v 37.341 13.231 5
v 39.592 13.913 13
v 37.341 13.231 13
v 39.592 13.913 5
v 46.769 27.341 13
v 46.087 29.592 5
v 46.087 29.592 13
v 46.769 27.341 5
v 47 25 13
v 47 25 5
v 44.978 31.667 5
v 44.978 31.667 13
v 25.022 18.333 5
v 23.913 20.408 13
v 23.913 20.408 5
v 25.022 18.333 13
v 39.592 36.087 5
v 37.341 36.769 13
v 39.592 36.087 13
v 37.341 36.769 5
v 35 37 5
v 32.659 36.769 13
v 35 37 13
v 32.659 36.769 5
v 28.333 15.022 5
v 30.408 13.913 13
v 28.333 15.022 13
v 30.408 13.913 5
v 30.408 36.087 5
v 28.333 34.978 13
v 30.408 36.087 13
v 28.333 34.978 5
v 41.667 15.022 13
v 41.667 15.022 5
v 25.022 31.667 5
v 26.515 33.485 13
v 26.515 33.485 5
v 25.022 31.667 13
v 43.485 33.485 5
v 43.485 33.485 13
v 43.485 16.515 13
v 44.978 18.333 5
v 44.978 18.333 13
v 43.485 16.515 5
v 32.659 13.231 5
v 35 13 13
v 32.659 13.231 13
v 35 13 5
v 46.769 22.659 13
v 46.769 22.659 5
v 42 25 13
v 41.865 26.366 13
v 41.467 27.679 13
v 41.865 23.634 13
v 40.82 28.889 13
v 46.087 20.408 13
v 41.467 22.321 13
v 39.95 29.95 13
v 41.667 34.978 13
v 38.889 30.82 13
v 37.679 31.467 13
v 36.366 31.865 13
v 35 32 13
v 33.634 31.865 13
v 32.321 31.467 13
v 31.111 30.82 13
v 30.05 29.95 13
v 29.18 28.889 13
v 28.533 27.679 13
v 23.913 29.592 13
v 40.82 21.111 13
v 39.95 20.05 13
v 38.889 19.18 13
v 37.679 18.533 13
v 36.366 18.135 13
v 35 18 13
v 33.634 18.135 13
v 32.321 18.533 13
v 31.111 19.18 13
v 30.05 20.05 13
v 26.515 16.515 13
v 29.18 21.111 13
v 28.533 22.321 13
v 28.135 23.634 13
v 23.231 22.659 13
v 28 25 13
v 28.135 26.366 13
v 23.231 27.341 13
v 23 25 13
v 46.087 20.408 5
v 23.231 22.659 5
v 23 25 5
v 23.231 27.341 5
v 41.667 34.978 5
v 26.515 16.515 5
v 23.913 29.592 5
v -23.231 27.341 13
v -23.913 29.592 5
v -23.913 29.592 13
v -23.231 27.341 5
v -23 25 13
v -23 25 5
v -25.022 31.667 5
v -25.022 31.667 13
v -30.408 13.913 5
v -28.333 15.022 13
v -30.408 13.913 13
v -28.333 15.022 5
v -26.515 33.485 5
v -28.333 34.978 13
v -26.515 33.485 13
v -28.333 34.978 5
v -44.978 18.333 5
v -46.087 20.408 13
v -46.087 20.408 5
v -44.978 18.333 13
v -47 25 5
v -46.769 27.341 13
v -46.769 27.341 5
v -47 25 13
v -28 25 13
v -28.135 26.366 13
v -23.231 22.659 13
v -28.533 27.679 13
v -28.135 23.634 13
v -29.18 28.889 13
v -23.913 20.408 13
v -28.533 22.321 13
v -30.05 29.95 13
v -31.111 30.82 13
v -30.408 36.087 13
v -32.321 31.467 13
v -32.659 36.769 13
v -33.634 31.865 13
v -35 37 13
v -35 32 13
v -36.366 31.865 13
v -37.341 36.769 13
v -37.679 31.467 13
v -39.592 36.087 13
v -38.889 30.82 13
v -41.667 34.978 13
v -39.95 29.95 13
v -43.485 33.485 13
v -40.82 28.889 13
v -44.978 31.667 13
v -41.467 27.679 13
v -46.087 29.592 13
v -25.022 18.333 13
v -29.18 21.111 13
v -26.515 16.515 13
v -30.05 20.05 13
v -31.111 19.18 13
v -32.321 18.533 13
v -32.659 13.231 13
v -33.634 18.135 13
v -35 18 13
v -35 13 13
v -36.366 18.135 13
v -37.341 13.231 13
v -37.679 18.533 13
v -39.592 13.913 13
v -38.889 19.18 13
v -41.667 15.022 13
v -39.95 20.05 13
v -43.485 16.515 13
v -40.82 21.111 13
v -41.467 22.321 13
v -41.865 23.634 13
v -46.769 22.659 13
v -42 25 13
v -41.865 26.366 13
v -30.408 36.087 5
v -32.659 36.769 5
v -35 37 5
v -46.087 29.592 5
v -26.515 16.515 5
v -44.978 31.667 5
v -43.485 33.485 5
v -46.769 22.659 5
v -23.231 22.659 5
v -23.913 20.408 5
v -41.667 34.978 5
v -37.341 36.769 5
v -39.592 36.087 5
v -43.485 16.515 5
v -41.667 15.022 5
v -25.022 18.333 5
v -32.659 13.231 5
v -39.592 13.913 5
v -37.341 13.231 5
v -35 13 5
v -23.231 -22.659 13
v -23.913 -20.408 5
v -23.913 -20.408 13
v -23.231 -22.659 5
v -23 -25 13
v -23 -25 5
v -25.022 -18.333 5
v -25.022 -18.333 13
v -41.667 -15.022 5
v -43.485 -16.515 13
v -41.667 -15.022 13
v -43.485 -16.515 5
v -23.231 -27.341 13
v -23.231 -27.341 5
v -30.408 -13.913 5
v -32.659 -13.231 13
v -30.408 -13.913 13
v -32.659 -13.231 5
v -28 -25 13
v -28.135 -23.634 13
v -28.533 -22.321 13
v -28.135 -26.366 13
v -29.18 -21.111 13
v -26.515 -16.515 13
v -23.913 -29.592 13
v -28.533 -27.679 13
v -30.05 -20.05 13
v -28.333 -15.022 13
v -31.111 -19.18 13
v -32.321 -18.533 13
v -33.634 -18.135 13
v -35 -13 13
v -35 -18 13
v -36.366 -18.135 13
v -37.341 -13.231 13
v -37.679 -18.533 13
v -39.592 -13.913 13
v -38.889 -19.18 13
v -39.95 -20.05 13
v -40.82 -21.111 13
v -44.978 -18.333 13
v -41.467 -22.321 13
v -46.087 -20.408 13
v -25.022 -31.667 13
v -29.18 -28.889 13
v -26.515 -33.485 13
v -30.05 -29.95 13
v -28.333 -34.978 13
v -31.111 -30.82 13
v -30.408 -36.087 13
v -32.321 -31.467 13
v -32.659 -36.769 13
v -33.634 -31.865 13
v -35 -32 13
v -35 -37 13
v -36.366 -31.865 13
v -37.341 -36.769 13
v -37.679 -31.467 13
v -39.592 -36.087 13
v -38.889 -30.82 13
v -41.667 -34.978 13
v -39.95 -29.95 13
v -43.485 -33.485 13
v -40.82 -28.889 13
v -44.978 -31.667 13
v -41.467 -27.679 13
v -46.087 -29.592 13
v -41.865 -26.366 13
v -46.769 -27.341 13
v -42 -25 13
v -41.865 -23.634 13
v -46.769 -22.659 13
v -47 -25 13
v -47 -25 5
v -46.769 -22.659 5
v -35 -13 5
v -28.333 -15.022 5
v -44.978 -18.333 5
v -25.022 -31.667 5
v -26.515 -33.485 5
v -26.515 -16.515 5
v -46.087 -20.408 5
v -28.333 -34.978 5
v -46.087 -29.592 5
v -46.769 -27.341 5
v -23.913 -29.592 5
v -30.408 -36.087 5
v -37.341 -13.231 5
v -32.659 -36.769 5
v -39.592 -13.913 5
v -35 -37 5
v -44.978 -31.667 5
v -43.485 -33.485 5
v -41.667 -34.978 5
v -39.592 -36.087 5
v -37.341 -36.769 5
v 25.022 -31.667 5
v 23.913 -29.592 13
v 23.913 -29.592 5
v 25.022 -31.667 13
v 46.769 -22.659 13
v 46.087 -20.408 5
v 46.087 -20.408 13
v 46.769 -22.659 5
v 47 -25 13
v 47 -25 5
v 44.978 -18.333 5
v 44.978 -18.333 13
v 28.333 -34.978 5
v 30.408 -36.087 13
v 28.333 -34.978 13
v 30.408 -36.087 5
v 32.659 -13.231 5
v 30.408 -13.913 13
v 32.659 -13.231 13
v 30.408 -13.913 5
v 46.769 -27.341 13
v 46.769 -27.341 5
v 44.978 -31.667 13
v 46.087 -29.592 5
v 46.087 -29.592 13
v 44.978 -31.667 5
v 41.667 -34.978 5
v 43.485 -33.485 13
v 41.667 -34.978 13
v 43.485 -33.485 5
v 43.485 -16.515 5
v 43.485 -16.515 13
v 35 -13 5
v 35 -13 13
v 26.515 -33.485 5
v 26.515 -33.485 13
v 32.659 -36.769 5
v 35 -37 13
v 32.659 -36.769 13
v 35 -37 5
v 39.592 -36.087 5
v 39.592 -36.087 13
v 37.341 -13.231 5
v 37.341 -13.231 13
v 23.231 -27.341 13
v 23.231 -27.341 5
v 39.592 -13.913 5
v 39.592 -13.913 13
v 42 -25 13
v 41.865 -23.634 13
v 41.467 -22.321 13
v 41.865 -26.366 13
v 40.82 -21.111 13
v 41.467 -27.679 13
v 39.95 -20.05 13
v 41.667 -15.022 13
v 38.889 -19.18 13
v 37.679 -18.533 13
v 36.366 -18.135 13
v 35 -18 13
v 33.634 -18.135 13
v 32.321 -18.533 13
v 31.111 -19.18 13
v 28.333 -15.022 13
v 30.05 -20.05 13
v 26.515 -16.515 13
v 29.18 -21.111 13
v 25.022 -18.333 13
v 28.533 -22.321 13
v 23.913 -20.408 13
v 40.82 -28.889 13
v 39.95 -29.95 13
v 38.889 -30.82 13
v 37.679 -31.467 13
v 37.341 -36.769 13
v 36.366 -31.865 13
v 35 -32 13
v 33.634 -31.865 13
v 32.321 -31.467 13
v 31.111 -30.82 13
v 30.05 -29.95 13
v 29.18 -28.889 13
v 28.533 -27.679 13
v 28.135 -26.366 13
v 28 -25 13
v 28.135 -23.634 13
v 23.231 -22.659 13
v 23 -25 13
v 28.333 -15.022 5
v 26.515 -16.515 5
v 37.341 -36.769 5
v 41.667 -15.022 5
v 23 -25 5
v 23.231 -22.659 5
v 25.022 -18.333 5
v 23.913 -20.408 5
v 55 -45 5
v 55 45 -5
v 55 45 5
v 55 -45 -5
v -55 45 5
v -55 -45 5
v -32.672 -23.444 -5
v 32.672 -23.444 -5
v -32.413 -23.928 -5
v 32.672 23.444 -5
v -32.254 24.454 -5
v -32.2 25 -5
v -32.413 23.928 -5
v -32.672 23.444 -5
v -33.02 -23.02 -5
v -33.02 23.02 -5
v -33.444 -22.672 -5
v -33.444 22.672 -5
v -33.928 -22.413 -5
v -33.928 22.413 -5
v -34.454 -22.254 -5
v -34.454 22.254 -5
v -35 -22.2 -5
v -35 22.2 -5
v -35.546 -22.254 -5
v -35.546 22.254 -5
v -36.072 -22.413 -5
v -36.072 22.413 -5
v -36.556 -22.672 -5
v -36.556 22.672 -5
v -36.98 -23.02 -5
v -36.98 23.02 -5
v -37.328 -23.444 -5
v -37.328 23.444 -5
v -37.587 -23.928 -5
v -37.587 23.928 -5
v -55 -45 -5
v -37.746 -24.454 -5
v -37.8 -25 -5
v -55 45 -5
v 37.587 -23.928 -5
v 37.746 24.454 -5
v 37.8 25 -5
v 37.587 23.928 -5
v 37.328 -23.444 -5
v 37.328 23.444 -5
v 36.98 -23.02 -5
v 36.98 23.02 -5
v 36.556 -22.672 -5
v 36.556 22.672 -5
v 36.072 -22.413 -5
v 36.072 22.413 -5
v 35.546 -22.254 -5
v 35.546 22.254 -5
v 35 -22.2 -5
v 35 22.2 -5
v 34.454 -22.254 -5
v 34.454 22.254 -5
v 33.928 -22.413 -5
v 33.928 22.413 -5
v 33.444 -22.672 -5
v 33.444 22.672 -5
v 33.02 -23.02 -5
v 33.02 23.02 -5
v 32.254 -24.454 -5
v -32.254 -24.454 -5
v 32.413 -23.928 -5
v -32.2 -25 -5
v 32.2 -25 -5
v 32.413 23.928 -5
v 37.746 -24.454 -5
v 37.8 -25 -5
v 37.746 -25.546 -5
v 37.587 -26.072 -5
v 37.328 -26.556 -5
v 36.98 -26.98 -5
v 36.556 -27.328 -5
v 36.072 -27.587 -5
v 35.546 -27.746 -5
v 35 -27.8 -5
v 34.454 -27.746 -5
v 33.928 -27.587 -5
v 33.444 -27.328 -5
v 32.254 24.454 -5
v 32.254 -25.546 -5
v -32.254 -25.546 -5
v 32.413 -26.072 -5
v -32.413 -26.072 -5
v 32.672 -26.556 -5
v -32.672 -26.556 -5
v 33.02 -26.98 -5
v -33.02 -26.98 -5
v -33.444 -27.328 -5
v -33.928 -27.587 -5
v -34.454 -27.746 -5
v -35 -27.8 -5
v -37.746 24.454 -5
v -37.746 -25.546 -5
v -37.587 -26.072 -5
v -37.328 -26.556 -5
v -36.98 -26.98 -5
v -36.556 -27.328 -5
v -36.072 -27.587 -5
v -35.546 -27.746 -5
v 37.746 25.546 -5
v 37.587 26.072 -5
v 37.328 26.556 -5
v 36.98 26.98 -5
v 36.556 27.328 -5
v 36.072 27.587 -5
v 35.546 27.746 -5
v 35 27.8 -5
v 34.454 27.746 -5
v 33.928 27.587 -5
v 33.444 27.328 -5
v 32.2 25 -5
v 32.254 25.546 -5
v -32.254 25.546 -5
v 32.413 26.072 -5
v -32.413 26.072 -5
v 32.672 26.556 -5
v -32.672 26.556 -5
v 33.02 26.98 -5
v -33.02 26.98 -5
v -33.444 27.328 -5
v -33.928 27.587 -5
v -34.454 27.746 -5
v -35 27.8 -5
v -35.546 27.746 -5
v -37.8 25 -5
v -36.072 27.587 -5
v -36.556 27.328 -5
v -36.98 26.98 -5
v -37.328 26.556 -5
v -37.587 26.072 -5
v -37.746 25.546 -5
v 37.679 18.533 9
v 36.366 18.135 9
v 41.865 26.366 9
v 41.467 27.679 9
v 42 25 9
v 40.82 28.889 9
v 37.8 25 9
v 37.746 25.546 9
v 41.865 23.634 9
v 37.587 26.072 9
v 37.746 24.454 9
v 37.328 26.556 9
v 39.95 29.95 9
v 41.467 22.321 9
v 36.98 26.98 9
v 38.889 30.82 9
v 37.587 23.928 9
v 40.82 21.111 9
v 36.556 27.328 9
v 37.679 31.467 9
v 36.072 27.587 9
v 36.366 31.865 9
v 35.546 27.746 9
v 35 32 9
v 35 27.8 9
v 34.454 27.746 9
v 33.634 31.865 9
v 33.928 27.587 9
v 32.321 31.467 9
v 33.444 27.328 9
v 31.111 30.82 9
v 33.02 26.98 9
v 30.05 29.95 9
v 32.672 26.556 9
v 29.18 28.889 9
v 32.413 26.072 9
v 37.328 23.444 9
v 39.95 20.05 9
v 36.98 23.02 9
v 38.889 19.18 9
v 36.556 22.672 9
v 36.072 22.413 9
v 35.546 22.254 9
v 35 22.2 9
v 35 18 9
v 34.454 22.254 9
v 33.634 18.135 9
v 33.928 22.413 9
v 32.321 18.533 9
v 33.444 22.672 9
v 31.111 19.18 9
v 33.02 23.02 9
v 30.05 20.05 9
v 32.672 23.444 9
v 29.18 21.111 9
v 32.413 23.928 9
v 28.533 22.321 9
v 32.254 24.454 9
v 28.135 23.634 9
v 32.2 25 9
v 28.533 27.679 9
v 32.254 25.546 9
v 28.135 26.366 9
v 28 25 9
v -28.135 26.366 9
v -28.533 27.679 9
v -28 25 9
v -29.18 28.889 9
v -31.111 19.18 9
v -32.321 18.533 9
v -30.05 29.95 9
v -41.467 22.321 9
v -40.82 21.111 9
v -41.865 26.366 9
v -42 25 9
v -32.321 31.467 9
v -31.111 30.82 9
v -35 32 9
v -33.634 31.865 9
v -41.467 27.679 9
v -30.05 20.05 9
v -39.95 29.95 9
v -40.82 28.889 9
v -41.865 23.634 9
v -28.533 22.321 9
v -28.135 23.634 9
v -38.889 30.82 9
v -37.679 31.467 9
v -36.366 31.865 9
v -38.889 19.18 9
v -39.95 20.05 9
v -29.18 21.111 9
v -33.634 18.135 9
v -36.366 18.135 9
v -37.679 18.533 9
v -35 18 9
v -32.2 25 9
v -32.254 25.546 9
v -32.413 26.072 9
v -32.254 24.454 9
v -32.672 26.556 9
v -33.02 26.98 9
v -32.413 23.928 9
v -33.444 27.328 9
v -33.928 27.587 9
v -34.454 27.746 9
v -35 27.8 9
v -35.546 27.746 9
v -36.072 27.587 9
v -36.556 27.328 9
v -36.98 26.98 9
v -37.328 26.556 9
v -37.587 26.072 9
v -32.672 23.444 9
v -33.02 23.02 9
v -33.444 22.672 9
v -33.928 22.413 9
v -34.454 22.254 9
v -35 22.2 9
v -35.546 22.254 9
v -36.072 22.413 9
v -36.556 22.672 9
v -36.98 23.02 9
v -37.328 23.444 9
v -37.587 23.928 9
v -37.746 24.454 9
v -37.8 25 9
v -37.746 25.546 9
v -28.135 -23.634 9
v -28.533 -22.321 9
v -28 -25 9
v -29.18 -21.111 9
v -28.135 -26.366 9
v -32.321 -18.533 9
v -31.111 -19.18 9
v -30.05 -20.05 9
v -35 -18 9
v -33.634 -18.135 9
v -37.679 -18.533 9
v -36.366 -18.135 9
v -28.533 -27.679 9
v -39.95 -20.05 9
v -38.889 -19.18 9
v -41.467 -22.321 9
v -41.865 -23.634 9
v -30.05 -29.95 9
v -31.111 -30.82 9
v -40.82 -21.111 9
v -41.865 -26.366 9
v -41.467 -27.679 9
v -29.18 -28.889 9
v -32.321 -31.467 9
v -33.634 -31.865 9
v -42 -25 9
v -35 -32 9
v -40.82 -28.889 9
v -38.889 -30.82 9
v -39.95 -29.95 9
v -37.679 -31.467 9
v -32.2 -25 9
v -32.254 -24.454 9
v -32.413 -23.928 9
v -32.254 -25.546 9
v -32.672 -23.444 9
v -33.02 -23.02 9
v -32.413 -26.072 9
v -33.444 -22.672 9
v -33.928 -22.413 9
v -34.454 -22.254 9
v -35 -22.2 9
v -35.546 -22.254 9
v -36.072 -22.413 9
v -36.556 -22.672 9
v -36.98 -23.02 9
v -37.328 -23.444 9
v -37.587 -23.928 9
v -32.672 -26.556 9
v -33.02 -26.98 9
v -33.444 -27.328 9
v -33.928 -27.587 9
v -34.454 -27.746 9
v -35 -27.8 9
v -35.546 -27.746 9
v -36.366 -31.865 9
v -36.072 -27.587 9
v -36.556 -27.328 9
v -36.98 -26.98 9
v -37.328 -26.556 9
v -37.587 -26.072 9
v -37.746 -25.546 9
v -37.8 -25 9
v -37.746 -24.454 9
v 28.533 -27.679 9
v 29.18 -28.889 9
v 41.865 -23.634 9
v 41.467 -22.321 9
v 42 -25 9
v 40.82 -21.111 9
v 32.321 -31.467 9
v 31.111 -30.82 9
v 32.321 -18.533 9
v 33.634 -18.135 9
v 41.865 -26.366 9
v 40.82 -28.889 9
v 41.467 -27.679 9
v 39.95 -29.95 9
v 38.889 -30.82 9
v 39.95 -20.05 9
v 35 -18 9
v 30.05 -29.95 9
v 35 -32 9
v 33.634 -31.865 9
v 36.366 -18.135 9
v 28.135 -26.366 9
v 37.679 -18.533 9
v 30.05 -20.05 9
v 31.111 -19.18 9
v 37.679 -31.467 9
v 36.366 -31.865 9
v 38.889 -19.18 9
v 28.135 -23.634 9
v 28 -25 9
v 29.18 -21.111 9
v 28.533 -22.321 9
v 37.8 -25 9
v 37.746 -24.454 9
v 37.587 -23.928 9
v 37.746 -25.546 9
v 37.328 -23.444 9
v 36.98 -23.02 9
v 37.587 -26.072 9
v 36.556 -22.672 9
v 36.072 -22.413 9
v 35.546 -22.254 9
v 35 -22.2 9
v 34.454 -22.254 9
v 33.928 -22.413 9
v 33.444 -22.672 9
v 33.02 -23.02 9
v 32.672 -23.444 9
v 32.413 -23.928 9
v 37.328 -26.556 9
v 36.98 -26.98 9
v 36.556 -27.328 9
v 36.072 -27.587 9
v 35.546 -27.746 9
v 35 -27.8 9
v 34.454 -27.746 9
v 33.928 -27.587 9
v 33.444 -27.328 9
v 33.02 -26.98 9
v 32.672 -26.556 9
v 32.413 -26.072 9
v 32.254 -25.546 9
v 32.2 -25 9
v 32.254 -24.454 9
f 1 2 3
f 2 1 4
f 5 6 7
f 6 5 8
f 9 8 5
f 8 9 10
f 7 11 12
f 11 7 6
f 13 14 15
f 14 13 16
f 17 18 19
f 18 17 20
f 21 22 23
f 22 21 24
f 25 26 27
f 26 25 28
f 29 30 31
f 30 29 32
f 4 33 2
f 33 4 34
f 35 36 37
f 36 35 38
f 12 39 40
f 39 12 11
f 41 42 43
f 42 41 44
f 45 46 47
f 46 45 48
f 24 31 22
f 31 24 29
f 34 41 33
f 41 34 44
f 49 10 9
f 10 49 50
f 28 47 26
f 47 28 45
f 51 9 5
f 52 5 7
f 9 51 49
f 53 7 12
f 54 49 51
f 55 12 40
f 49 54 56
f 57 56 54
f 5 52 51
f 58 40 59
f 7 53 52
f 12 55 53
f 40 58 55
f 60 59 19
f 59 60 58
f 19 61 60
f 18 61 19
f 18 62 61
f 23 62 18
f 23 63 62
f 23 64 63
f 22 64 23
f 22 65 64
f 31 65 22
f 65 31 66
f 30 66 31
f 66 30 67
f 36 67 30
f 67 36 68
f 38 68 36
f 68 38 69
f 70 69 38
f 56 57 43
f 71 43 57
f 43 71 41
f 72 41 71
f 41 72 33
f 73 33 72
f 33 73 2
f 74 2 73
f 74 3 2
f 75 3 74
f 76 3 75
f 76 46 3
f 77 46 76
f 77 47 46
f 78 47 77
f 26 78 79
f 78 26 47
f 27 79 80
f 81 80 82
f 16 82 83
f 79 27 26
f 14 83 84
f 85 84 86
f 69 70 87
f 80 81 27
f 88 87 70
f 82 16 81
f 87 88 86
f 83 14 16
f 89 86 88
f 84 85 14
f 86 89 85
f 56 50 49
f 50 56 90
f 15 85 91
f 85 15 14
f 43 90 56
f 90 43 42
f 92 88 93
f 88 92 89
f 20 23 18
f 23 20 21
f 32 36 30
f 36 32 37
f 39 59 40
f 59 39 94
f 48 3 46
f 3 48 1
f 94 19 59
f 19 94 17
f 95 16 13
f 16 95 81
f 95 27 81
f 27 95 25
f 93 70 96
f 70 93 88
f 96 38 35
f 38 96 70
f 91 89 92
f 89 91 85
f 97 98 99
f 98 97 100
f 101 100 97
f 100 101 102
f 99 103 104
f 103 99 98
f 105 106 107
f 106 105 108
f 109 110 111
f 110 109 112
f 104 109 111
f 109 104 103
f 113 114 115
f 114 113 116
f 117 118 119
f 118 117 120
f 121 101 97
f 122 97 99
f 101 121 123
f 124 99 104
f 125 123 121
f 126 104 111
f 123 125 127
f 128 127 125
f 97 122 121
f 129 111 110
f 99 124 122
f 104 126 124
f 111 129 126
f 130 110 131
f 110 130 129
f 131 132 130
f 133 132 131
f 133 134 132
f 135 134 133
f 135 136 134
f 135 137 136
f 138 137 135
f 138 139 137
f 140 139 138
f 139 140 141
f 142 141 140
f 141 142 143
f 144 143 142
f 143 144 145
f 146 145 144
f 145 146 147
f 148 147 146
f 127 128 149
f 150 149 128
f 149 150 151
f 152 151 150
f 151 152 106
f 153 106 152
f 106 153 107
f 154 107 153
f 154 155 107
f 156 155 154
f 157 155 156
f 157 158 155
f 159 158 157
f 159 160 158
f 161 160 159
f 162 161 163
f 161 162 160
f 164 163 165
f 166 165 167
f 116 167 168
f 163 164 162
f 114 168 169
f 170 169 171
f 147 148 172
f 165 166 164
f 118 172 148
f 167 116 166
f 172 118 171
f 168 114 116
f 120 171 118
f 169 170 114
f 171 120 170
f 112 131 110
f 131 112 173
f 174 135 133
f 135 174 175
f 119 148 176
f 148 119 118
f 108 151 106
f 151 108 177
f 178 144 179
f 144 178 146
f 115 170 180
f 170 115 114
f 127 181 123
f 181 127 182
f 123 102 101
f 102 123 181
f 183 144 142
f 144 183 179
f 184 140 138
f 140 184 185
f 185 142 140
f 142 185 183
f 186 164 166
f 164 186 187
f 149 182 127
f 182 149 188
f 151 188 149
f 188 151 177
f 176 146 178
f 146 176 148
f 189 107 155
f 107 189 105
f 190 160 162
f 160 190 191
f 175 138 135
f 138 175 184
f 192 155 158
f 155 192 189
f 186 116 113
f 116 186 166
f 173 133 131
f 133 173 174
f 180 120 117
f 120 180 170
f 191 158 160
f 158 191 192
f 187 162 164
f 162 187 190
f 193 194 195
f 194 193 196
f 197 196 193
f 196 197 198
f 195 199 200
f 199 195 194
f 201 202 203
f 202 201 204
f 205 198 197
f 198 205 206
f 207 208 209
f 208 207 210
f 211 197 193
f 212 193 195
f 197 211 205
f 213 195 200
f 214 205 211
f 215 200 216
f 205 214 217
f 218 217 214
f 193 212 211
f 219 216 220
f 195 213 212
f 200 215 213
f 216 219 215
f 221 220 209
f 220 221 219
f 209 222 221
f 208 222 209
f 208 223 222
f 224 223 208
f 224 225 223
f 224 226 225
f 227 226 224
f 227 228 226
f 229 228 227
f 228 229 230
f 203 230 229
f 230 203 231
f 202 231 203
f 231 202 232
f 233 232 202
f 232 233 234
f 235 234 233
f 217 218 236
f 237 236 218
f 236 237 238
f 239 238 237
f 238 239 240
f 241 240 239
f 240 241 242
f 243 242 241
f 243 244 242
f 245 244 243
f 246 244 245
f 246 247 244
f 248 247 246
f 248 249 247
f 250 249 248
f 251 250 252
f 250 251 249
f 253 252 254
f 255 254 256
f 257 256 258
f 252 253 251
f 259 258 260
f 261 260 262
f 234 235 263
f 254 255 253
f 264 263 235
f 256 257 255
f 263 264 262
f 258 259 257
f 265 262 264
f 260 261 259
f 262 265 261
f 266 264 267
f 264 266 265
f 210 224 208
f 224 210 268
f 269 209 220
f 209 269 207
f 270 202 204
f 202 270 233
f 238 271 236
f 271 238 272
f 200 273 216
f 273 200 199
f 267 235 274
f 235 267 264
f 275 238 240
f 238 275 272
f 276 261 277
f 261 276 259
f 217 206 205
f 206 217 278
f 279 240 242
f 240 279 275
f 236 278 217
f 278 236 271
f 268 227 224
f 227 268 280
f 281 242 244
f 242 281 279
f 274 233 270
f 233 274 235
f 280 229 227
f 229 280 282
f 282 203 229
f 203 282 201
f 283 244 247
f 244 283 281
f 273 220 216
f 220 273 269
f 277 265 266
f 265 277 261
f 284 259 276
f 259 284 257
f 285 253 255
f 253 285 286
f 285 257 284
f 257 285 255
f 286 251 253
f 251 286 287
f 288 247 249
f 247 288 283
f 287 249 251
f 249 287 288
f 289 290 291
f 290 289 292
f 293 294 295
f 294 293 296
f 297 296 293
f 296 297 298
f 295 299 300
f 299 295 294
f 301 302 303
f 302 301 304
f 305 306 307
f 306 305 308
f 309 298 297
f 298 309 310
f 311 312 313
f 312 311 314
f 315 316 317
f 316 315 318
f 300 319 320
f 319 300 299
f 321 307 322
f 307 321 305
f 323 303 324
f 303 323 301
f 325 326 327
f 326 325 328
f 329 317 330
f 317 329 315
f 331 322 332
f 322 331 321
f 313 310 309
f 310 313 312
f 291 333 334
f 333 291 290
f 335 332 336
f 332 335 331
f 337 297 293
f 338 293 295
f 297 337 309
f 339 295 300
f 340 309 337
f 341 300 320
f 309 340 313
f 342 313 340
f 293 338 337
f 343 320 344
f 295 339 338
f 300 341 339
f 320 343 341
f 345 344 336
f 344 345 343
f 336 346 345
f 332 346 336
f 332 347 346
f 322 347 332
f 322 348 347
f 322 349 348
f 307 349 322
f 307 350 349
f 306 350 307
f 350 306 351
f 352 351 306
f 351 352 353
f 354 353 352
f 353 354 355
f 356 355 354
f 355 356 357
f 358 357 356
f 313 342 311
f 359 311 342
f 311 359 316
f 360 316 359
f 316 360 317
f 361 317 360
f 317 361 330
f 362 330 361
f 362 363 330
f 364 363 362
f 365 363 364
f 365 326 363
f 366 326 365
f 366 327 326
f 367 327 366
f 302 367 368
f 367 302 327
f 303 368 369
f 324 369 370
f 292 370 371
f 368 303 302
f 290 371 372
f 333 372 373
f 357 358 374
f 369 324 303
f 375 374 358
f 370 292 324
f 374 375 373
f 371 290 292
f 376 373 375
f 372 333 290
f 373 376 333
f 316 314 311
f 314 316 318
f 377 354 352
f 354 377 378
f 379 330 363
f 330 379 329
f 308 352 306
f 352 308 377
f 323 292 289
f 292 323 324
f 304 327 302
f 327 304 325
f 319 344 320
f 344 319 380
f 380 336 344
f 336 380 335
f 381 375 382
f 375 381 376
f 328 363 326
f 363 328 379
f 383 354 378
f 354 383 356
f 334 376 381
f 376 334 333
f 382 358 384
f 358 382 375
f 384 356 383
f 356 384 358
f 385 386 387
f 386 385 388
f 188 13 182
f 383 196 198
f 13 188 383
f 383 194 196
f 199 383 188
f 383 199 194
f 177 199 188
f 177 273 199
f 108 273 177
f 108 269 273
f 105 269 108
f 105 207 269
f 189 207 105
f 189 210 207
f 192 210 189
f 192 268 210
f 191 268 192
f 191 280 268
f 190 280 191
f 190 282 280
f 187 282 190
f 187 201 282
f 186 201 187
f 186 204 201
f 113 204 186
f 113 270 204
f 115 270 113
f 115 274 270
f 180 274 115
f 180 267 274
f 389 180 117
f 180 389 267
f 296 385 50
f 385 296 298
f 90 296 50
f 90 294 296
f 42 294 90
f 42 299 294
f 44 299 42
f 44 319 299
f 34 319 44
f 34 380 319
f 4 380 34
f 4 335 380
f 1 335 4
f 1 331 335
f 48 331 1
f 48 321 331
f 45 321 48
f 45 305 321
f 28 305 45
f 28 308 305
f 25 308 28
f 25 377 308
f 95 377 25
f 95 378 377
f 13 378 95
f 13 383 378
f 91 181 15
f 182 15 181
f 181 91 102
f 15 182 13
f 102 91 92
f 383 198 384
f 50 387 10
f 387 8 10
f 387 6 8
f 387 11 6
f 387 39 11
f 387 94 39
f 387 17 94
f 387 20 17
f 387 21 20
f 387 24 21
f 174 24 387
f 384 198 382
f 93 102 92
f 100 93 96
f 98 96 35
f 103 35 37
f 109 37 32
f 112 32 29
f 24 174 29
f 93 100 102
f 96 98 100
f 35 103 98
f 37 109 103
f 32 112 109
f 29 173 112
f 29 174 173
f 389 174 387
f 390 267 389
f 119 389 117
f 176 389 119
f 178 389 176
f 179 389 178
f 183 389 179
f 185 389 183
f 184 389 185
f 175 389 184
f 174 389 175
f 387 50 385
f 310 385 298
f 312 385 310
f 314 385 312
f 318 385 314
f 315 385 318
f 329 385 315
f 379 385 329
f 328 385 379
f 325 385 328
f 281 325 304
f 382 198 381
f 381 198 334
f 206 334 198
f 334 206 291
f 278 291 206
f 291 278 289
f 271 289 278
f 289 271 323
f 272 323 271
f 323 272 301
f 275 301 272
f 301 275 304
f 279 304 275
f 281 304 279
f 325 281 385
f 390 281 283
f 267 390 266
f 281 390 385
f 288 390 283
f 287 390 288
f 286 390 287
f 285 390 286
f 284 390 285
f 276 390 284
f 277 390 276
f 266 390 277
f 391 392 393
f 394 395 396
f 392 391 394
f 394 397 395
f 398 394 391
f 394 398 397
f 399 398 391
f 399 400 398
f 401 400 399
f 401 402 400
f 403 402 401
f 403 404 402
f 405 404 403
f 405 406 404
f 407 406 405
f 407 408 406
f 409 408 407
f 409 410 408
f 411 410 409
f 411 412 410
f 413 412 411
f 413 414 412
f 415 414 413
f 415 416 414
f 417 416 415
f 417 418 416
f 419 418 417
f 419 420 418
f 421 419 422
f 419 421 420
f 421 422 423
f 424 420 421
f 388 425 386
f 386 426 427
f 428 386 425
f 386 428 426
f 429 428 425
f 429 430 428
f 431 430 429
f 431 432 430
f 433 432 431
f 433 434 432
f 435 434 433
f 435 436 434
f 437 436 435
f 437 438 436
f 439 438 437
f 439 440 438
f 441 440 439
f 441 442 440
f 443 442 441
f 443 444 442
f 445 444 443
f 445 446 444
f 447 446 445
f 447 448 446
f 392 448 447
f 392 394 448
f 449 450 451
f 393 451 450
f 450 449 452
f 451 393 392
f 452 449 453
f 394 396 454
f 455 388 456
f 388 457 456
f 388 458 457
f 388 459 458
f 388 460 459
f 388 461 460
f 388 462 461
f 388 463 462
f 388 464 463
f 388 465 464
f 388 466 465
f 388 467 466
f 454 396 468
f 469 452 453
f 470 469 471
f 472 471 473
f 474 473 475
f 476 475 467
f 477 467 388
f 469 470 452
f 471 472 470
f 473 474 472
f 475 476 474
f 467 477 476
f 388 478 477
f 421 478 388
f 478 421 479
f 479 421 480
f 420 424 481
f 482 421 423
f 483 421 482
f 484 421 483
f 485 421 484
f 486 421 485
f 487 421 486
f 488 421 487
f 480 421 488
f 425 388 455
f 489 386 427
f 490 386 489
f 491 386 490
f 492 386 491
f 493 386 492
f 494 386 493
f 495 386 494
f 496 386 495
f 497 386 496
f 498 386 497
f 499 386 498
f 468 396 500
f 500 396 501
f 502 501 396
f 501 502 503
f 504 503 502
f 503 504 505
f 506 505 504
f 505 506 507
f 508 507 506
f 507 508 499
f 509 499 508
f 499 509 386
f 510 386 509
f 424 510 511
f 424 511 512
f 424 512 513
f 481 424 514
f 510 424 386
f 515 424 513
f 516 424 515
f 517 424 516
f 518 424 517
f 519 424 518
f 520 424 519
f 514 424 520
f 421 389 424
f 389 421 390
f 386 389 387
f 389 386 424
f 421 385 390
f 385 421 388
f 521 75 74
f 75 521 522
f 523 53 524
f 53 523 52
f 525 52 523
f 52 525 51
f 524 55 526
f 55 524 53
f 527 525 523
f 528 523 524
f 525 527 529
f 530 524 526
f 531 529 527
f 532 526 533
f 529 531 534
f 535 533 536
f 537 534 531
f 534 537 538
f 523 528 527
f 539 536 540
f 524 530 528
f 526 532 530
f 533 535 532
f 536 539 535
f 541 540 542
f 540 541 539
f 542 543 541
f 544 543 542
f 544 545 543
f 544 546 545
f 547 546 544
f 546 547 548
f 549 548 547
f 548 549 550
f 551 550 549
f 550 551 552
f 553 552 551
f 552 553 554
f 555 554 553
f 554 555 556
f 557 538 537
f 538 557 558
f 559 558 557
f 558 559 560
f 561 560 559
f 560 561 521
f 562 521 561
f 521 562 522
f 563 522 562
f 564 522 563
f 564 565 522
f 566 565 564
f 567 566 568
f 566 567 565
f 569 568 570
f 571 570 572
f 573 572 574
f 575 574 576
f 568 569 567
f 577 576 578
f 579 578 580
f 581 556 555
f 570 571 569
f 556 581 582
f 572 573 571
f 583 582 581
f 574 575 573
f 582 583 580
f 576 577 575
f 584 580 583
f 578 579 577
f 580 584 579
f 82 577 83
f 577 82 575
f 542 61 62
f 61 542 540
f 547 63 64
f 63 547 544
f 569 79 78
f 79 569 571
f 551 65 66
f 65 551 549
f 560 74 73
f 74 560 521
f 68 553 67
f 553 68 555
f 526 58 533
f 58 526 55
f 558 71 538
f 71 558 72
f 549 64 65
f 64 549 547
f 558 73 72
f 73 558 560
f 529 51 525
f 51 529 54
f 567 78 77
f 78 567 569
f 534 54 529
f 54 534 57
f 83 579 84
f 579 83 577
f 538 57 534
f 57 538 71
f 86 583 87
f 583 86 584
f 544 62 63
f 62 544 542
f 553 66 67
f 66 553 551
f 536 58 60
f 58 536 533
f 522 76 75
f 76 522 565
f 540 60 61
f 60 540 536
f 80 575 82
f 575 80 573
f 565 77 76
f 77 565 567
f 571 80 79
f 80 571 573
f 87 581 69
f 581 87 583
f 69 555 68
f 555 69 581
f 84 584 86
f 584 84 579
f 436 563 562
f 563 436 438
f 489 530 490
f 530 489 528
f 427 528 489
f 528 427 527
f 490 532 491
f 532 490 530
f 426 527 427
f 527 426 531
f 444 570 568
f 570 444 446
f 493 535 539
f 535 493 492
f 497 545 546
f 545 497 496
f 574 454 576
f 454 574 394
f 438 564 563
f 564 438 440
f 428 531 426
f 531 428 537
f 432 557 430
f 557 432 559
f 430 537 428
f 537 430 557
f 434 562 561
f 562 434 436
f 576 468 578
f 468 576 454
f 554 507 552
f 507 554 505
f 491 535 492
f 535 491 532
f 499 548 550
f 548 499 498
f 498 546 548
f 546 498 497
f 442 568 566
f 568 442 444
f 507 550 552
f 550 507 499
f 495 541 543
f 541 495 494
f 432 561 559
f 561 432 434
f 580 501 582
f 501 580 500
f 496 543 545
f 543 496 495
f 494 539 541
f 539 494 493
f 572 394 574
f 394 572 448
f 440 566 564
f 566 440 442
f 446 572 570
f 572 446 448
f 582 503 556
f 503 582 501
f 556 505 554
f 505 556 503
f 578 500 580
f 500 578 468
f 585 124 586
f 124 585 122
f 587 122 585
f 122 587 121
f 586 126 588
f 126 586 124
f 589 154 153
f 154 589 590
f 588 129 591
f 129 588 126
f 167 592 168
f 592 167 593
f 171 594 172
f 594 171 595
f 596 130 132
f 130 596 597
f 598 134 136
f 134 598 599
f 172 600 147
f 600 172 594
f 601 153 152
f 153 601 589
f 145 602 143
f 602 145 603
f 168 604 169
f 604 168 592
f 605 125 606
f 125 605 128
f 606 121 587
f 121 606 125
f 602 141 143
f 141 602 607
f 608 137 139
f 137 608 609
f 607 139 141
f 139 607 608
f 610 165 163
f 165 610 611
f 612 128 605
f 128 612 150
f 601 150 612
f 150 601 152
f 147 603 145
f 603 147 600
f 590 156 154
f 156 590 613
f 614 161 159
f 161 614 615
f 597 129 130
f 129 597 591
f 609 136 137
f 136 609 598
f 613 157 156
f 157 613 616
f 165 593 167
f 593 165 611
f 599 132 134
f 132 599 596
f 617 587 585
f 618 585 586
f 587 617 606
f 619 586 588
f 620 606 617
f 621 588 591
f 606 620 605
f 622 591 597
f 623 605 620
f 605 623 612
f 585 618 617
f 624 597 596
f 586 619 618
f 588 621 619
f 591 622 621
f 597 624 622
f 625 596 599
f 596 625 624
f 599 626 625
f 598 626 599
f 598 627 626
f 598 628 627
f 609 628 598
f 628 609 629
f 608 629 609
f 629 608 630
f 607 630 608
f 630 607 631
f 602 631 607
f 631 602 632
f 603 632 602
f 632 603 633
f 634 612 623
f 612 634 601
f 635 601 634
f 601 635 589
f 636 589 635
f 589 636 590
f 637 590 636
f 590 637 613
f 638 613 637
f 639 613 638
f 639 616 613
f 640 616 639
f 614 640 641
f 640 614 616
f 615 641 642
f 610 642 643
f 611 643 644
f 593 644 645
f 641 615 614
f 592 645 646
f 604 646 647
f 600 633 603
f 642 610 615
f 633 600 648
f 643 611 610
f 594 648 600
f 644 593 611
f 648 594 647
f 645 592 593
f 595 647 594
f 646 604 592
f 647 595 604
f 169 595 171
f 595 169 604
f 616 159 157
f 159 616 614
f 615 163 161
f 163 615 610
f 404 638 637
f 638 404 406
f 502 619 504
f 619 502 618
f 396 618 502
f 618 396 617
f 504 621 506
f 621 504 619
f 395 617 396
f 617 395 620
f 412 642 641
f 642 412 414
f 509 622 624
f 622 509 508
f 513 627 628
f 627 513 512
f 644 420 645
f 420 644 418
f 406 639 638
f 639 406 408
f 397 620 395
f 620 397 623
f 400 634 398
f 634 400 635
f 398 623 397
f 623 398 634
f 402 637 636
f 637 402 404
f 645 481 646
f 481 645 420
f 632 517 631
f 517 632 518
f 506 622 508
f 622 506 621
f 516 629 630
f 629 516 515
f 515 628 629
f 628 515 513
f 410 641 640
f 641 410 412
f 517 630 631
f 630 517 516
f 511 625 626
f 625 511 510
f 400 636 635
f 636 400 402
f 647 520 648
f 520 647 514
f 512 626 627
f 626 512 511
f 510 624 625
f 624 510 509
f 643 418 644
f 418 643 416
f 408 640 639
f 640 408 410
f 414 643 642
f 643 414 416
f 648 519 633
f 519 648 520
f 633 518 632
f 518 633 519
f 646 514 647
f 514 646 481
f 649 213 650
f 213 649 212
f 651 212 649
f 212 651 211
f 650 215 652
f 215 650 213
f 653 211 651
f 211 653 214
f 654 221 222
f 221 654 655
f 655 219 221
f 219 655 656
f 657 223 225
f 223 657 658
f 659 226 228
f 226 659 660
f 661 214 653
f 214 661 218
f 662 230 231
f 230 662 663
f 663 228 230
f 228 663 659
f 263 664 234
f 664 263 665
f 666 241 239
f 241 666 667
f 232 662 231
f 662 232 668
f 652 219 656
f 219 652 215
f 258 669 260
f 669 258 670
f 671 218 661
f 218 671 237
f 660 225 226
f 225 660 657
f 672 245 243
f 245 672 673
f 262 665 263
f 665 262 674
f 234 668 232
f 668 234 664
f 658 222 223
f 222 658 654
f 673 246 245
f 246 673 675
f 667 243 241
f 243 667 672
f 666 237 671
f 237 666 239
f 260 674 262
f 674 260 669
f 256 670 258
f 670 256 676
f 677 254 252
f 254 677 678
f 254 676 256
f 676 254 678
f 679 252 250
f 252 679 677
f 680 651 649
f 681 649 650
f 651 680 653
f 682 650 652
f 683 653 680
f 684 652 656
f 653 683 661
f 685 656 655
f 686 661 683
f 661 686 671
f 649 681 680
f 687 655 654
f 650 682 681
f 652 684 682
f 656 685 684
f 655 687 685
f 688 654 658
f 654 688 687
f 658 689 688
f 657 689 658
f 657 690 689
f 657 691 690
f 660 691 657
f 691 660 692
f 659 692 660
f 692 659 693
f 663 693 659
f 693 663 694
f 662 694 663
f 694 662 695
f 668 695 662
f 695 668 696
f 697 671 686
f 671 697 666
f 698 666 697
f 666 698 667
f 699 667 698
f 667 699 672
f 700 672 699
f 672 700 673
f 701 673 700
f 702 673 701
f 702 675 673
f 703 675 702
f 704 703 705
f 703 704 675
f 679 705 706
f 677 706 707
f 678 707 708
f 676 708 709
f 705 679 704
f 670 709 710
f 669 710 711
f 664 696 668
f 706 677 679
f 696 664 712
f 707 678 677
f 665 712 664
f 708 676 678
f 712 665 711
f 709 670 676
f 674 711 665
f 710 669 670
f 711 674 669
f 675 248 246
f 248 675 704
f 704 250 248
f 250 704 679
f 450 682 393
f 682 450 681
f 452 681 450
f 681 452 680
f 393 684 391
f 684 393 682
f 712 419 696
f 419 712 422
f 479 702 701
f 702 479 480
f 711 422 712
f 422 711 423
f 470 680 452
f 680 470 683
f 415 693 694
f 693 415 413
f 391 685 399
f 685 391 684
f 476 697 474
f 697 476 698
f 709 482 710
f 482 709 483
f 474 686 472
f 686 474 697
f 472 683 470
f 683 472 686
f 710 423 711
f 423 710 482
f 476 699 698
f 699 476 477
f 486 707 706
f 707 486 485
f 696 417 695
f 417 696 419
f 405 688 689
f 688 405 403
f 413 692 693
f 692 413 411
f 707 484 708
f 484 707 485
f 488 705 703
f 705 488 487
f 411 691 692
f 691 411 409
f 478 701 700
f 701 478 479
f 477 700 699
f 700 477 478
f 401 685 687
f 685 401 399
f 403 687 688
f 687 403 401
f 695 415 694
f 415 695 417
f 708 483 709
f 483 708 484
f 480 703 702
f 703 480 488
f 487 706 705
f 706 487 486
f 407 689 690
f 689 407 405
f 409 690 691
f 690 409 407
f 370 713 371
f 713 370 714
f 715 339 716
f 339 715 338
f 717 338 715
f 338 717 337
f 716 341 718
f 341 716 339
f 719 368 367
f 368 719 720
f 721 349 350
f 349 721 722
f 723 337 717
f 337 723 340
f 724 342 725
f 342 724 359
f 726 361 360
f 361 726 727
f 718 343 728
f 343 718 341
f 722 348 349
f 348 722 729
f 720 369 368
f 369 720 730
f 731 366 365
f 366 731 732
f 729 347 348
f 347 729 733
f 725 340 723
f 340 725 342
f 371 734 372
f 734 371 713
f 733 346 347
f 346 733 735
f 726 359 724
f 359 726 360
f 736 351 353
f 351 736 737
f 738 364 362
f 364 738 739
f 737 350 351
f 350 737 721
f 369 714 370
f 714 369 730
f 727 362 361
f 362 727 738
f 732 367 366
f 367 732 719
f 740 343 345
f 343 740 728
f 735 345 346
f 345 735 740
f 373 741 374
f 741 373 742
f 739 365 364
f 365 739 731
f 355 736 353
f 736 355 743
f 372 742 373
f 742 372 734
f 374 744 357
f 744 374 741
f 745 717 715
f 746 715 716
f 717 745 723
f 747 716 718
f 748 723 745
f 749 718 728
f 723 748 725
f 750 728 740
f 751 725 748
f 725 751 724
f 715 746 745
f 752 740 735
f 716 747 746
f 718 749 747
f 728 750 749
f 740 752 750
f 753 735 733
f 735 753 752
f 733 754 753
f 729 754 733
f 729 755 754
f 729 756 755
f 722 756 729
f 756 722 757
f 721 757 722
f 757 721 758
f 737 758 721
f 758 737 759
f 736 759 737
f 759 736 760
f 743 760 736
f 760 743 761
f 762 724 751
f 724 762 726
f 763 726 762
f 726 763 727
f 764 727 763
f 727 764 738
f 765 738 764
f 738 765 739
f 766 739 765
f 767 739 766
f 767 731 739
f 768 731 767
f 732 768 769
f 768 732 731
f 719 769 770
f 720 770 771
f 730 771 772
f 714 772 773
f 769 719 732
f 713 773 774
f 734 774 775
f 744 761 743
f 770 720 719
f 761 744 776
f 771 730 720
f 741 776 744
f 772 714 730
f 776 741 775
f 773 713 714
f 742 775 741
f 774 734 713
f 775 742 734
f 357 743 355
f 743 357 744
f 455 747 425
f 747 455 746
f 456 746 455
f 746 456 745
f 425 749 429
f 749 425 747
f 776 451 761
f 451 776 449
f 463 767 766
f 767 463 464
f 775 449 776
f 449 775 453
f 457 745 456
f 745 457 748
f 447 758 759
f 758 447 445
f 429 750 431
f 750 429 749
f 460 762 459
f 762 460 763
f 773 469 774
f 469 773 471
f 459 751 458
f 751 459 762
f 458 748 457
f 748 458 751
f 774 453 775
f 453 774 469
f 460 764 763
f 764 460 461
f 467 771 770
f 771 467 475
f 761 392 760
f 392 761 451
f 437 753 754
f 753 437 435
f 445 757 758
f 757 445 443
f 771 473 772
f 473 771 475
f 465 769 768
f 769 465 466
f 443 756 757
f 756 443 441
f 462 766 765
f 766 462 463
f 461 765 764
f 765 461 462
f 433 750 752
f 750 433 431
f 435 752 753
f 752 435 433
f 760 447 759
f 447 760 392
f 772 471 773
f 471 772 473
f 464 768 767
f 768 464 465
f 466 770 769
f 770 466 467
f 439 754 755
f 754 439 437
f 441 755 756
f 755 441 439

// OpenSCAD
$fn = 32;

// ----------------------------------------------------------------------
// Socket pad plate
// bosses with counterbored sockets for the screws
// ----------------------------------------------------------------------

// --- parameters (mm) ---
base_t = 10;            // base plate thickness
boss_h = 8;             // boss height above the base plate
boss_d = 24;            // boss diameter
socket_d = 14;          // socket diameter
socket_depth = 4;       // socket depth from the boss face
bolt_d = 5.6;           // screw clearance hole through the socket floor
plate = [110, 90, 10];  // overall size (x, y, z)
edge = 20;              // boss centre offset from the plate edge
pads = 4;               // boss count, one per corner

// --- derived feature positions (mm) ---
height = base_t + boss_h;        // = 18   overall height of the part
corner_x = plate[0] / 2 - edge;  // = 35   boss centre X
corner_y = plate[1] / 2 - edge;  // = 25   boss centre Y
feature_centers = [
  [corner_x, corner_y],
  [-corner_x, corner_y],
  [-corner_x, -corner_y],
  [corner_x, -corner_y]
];   // boss centres: sockets, holes and the pads themselves are placed from here

// base plate, bosses on feature_centers, socket + through hole in each
difference() {
  union() {
    cube(plate, center = true);
    for (centre = feature_centers)
      translate([centre[0], centre[1], plate[2] / 2 - 1])
        cylinder(d = boss_d, h = boss_h + 1);
  }
  for (centre = feature_centers) {
    translate([centre[0], centre[1], plate[2] / 2 + boss_h - socket_depth])
      cylinder(d = socket_d, h = socket_depth + 1);
    translate([centre[0], centre[1], -height])
      cylinder(d = bolt_d, h = 2 * height + 2);  // through the socket floor
  }
}
